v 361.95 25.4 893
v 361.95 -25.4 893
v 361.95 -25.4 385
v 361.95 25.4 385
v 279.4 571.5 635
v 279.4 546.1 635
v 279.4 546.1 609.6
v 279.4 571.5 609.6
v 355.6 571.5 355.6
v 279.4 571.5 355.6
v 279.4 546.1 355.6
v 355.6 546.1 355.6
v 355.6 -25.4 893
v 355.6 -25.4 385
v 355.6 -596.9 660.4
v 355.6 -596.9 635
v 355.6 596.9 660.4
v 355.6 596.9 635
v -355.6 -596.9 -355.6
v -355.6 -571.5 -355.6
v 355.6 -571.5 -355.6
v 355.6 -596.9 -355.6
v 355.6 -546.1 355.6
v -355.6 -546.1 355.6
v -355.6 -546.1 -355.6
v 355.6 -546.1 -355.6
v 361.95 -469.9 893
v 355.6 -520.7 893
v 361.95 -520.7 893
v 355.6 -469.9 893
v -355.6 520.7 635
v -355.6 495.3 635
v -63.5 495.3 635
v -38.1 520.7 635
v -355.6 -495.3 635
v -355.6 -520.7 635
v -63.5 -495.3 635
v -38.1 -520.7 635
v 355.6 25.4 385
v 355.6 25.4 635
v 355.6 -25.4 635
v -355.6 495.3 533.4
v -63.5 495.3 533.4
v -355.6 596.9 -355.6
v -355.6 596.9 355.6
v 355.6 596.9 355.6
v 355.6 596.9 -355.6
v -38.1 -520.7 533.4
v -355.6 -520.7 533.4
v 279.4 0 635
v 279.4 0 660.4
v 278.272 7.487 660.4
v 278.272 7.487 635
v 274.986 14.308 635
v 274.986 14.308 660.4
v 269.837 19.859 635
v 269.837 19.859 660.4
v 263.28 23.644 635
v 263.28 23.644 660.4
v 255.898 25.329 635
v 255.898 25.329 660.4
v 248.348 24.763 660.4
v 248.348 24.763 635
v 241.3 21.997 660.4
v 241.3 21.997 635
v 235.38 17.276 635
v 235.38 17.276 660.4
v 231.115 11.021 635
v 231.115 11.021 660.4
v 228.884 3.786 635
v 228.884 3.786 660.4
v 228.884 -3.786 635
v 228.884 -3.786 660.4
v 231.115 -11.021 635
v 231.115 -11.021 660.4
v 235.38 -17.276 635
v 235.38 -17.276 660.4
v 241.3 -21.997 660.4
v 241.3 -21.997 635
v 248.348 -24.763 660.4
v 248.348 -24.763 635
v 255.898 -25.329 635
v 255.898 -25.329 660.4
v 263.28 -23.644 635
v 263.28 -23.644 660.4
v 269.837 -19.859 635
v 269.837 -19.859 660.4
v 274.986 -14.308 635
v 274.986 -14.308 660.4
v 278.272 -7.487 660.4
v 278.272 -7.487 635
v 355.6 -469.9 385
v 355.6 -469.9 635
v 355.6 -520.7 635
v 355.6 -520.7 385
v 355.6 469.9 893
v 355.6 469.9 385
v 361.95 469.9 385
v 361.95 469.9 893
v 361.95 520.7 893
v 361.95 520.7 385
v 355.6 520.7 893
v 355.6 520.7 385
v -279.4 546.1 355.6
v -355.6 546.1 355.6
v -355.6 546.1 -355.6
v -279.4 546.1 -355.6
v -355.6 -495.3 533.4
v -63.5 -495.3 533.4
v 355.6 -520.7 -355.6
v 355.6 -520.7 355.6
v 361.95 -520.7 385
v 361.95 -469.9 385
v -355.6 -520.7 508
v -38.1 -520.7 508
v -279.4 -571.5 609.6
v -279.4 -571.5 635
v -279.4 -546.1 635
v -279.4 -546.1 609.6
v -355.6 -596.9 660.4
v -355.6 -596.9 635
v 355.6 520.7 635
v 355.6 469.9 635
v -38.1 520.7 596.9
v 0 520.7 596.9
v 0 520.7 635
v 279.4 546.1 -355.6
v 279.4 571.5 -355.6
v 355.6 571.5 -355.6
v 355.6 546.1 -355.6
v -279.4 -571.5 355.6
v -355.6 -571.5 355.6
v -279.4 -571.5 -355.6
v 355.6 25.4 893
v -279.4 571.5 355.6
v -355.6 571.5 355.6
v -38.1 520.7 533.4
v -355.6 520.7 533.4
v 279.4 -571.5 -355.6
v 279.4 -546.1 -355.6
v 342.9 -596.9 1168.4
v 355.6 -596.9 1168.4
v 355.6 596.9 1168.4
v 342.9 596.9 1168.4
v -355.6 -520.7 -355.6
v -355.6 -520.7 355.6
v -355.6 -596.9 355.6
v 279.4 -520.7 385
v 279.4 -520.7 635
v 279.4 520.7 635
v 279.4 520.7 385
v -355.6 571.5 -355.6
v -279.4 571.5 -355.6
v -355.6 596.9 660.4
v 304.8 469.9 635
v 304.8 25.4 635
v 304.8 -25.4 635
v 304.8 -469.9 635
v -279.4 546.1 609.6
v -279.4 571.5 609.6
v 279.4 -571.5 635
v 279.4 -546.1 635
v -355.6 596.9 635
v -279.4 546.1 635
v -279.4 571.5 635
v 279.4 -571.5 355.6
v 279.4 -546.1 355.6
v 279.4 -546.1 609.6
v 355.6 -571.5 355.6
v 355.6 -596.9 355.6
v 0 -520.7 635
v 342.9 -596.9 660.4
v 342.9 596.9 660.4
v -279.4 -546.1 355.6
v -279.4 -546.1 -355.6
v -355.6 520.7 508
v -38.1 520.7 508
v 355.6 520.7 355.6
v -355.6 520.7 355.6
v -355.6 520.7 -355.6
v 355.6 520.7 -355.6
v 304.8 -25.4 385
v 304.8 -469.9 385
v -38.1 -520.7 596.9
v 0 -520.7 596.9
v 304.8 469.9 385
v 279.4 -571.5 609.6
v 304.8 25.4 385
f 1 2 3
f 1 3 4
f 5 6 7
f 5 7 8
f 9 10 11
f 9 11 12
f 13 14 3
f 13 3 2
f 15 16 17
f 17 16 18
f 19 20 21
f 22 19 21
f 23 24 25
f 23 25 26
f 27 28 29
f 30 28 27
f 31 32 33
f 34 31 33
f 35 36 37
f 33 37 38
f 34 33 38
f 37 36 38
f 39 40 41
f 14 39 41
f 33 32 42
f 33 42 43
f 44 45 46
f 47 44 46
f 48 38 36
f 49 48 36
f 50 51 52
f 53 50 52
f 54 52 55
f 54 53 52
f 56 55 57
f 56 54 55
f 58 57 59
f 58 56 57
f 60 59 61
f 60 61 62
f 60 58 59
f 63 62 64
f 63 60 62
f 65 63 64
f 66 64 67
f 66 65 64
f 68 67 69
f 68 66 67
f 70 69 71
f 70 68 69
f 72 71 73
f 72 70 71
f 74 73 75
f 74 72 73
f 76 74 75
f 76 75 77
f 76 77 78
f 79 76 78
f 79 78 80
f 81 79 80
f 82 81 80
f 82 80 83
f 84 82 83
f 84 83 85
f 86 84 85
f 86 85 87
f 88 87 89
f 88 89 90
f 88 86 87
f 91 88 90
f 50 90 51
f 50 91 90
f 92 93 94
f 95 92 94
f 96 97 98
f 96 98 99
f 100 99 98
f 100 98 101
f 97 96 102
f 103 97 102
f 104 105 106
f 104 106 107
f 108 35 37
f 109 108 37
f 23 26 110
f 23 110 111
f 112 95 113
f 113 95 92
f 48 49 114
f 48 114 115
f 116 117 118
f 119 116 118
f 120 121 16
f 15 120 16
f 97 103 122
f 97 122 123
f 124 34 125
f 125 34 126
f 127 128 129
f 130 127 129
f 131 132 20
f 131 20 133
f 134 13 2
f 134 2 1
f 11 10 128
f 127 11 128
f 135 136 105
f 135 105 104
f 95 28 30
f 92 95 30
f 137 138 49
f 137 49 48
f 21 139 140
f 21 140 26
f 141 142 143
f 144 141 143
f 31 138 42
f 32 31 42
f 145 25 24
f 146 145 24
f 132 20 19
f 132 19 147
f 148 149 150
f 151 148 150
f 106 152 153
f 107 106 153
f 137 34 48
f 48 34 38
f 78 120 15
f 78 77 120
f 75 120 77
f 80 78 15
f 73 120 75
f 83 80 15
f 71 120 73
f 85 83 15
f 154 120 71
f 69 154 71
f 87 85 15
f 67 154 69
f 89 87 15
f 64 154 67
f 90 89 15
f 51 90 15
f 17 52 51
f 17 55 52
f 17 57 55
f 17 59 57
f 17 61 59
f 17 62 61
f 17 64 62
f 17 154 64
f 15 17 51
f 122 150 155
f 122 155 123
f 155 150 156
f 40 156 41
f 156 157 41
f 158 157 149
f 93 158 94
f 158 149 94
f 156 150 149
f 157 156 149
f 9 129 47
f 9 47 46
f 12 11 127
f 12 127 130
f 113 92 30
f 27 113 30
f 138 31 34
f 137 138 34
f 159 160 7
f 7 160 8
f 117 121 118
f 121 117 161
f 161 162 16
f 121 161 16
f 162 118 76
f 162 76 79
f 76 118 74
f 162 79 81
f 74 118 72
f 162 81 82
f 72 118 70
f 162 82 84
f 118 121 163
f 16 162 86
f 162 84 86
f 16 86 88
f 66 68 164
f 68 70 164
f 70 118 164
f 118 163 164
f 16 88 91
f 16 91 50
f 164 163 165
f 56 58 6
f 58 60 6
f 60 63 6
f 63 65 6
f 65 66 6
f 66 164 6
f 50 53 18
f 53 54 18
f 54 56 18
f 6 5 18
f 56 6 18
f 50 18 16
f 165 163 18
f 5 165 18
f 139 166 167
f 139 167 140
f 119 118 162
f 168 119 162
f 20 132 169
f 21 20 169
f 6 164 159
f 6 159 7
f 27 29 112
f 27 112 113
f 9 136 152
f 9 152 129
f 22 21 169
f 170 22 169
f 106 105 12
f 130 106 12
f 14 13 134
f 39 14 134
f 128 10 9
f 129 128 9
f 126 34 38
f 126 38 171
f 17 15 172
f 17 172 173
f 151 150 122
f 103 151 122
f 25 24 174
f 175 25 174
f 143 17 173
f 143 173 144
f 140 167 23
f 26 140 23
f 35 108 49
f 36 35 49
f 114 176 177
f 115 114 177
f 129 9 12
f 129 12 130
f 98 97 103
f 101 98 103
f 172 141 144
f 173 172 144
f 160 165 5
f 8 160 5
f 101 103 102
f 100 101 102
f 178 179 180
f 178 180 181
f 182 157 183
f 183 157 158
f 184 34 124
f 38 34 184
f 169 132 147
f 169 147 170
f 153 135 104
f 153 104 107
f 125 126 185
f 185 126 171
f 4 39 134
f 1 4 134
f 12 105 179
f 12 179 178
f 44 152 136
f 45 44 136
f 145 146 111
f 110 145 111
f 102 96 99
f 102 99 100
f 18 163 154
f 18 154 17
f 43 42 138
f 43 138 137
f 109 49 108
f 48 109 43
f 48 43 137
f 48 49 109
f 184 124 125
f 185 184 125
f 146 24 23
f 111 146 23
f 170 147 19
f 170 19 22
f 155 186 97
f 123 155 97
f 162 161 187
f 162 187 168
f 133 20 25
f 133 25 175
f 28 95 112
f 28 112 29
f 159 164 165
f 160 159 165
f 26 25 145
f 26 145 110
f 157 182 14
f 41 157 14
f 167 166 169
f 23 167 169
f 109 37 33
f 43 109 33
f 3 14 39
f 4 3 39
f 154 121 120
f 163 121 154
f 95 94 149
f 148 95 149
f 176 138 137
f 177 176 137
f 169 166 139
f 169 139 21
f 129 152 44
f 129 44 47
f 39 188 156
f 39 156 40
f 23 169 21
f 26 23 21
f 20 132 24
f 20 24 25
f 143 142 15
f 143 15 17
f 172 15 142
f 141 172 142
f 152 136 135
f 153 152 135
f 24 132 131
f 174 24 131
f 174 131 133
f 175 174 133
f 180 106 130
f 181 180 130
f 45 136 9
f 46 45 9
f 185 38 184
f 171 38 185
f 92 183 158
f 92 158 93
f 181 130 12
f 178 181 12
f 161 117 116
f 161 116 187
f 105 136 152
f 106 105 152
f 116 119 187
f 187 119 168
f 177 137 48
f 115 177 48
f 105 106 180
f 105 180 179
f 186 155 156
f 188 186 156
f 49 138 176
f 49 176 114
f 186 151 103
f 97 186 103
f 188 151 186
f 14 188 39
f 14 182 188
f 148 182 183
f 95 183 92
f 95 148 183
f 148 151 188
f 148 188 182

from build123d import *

# Parameters (mm, degrees)
F1_W      = 711.2
F1_H      = 711.2
F2_DEPTH  = 25.4
F5_W      = 76.2
F5_H      = 711.2
F7_DEPTH  = 25.4
F10_W     = 558.8
F10_H     = 25.4
F11_DEPTH = 25.4
F12_W     = 711.2
F12_H     = 1193.8
F12_R     = 25.4
F13_DEPTH = 25.4
F14_W     = 292.1
F14_H     = 25.4
F15_DEPTH = 101.6
F16_W     = 317.5
F16_H     = 1041.4
F17_DEPTH = 25.4
F18_W     = 50.8
F18_H     = 50.8
F19_DEPTH = 250
F20_W     = 1193.8
F20_H     = 508
F21_DEPTH = 12.7
F22_W     = 50.8
F22_H     = 508
F23_DEPTH = 6.35
F24_W     = 38.1
F24_H     = 1041.4
F25_DEPTH = 38.1


with BuildPart() as f2:
    # F1 (on offset) → F2 (new body)
    with BuildSketch(Plane.XZ.offset(571.5)):
        Rectangle(F1_W, F1_H)
    extrude(amount=F2_DEPTH)


with BuildPart() as f6_1:
    # F6: instance of F2
    add(f2.part.mirror(Plane.XZ.offset(558.8)))


with BuildPart() as f7:
    # F5 (on offset) → F7 (new body)
    with BuildSketch(Plane(origin=(0, -571.5, 0), x_dir=(1, 0, 0), z_dir=(0, 1, 0))):
        with Locations((-317.5, 0)):
            Rectangle(F5_W, F5_H)
        with Locations((317.5, 0)):
            Rectangle(F5_W, F5_H)
    extrude(amount=F7_DEPTH)


with BuildPart() as f8_1:
    # F8: instance of F2
    add(f2.part.mirror(Plane.XZ))


with BuildPart() as f8_2:
    # F8: instance of F7
    add(f7.part.mirror(Plane.XZ))


with BuildPart() as f8_3:
    # F8: instance of F6_1
    add(f6_1.part.mirror(Plane.XZ))


with BuildPart() as f11:
    # F10 (on offset) → F11 (new body)
    with BuildSketch(Plane.XY.offset(635)):
        with Locations((0, -558.8)):
            Rectangle(F10_W, F10_H)
        with Locations((0, 558.8)):
            Rectangle(F10_W, F10_H)
    extrude(amount=-F11_DEPTH)

    # F12 (on face) → F13 (join)
    with BuildSketch(Plane.XY.offset(635)):
        Rectangle(F12_W, F12_H)
        with Locations((254, 0)):
            Circle(F12_R, mode=Mode.SUBTRACT)
    extrude(amount=F13_DEPTH)


with BuildPart() as f15:
    # F14 (on face) → F15 (new body)
    with BuildSketch(Plane(origin=(0, 0, 635), x_dir=(1, 0, 0), z_dir=(0, 0, -1))):
        Polygon((-63.5, -520.7), (-38.1, -520.7), (-38.1, 520.7), (-63.5, 520.7), (-63.5, 495.3), (-63.5, 0), (-63.5, -495.3), align=None)
        with Locations((-209.55, -508)):
            Rectangle(F14_W, F14_H)
        with Locations((-209.55, 508)):
            Rectangle(F14_W, F14_H)
    extrude(amount=F15_DEPTH)


with BuildPart() as f17:
    # F16 (on face) → F17 (new body)
    with BuildSketch(Plane(origin=(0, 0, 533.4), x_dir=(1, 0, 0), z_dir=(0, 0, -1))):
        with Locations((-196.85, 0)):
            Rectangle(F16_W, F16_H)
    extrude(amount=F17_DEPTH)


with BuildPart() as f19:
    # F18 (on face) → F19 (new body)
    with BuildSketch(Plane(origin=(0, 0, 635), x_dir=(1, 0, 0), z_dir=(0, 0, -1))):
        Polygon((279.4, 520.7), (279.4, -520.7), (304.8, -520.7), (304.8, -469.9), (304.8, -25.4), (304.8, 25.4), (304.8, 469.9), (304.8, 520.7), align=None)
        with Locations((330.2, -495.3)):
            Rectangle(F18_W, F18_H)
        with Locations((330.2, 495.3)):
            Rectangle(F18_W, F18_H)
        with Locations((330.2, 0)):
            Rectangle(F18_W, F18_H)
    extrude(amount=F19_DEPTH)


with BuildPart() as f21:
    # F20 (on face) → F21 (new body)
    with BuildSketch(Plane.YZ.offset(355.6)):
        with Locations((0, 914.4)):
            Rectangle(F20_W, F20_H)
    extrude(amount=-F21_DEPTH)


with BuildPart() as f23:
    # F22 (on face) → F23 (new body)
    with BuildSketch(Plane.YZ.offset(355.6)):
        with Locations((0, 639)):
            Rectangle(F22_W, F22_H)
        with Locations((495.3, 639)):
            Rectangle(F22_W, F22_H)
        with Locations((-495.3, 639)):
            Rectangle(F22_W, F22_H)
    extrude(amount=F23_DEPTH)


with BuildPart() as f25:
    # F24 (on face) → F25 (new body)
    with BuildSketch(Plane(origin=(0, 0, 635), x_dir=(1, 0, 0), z_dir=(0, 0, -1))):
        with Locations((-19.05, 0)):
            Rectangle(F24_W, F24_H)
    extrude(amount=F25_DEPTH)


solid = Compound([f2.part, f6_1.part, f7.part, f8_1.part, f8_2.part, f8_3.part, f11.part, f15.part, f17.part, f19.part, f21.part, f23.part, f25.part])
